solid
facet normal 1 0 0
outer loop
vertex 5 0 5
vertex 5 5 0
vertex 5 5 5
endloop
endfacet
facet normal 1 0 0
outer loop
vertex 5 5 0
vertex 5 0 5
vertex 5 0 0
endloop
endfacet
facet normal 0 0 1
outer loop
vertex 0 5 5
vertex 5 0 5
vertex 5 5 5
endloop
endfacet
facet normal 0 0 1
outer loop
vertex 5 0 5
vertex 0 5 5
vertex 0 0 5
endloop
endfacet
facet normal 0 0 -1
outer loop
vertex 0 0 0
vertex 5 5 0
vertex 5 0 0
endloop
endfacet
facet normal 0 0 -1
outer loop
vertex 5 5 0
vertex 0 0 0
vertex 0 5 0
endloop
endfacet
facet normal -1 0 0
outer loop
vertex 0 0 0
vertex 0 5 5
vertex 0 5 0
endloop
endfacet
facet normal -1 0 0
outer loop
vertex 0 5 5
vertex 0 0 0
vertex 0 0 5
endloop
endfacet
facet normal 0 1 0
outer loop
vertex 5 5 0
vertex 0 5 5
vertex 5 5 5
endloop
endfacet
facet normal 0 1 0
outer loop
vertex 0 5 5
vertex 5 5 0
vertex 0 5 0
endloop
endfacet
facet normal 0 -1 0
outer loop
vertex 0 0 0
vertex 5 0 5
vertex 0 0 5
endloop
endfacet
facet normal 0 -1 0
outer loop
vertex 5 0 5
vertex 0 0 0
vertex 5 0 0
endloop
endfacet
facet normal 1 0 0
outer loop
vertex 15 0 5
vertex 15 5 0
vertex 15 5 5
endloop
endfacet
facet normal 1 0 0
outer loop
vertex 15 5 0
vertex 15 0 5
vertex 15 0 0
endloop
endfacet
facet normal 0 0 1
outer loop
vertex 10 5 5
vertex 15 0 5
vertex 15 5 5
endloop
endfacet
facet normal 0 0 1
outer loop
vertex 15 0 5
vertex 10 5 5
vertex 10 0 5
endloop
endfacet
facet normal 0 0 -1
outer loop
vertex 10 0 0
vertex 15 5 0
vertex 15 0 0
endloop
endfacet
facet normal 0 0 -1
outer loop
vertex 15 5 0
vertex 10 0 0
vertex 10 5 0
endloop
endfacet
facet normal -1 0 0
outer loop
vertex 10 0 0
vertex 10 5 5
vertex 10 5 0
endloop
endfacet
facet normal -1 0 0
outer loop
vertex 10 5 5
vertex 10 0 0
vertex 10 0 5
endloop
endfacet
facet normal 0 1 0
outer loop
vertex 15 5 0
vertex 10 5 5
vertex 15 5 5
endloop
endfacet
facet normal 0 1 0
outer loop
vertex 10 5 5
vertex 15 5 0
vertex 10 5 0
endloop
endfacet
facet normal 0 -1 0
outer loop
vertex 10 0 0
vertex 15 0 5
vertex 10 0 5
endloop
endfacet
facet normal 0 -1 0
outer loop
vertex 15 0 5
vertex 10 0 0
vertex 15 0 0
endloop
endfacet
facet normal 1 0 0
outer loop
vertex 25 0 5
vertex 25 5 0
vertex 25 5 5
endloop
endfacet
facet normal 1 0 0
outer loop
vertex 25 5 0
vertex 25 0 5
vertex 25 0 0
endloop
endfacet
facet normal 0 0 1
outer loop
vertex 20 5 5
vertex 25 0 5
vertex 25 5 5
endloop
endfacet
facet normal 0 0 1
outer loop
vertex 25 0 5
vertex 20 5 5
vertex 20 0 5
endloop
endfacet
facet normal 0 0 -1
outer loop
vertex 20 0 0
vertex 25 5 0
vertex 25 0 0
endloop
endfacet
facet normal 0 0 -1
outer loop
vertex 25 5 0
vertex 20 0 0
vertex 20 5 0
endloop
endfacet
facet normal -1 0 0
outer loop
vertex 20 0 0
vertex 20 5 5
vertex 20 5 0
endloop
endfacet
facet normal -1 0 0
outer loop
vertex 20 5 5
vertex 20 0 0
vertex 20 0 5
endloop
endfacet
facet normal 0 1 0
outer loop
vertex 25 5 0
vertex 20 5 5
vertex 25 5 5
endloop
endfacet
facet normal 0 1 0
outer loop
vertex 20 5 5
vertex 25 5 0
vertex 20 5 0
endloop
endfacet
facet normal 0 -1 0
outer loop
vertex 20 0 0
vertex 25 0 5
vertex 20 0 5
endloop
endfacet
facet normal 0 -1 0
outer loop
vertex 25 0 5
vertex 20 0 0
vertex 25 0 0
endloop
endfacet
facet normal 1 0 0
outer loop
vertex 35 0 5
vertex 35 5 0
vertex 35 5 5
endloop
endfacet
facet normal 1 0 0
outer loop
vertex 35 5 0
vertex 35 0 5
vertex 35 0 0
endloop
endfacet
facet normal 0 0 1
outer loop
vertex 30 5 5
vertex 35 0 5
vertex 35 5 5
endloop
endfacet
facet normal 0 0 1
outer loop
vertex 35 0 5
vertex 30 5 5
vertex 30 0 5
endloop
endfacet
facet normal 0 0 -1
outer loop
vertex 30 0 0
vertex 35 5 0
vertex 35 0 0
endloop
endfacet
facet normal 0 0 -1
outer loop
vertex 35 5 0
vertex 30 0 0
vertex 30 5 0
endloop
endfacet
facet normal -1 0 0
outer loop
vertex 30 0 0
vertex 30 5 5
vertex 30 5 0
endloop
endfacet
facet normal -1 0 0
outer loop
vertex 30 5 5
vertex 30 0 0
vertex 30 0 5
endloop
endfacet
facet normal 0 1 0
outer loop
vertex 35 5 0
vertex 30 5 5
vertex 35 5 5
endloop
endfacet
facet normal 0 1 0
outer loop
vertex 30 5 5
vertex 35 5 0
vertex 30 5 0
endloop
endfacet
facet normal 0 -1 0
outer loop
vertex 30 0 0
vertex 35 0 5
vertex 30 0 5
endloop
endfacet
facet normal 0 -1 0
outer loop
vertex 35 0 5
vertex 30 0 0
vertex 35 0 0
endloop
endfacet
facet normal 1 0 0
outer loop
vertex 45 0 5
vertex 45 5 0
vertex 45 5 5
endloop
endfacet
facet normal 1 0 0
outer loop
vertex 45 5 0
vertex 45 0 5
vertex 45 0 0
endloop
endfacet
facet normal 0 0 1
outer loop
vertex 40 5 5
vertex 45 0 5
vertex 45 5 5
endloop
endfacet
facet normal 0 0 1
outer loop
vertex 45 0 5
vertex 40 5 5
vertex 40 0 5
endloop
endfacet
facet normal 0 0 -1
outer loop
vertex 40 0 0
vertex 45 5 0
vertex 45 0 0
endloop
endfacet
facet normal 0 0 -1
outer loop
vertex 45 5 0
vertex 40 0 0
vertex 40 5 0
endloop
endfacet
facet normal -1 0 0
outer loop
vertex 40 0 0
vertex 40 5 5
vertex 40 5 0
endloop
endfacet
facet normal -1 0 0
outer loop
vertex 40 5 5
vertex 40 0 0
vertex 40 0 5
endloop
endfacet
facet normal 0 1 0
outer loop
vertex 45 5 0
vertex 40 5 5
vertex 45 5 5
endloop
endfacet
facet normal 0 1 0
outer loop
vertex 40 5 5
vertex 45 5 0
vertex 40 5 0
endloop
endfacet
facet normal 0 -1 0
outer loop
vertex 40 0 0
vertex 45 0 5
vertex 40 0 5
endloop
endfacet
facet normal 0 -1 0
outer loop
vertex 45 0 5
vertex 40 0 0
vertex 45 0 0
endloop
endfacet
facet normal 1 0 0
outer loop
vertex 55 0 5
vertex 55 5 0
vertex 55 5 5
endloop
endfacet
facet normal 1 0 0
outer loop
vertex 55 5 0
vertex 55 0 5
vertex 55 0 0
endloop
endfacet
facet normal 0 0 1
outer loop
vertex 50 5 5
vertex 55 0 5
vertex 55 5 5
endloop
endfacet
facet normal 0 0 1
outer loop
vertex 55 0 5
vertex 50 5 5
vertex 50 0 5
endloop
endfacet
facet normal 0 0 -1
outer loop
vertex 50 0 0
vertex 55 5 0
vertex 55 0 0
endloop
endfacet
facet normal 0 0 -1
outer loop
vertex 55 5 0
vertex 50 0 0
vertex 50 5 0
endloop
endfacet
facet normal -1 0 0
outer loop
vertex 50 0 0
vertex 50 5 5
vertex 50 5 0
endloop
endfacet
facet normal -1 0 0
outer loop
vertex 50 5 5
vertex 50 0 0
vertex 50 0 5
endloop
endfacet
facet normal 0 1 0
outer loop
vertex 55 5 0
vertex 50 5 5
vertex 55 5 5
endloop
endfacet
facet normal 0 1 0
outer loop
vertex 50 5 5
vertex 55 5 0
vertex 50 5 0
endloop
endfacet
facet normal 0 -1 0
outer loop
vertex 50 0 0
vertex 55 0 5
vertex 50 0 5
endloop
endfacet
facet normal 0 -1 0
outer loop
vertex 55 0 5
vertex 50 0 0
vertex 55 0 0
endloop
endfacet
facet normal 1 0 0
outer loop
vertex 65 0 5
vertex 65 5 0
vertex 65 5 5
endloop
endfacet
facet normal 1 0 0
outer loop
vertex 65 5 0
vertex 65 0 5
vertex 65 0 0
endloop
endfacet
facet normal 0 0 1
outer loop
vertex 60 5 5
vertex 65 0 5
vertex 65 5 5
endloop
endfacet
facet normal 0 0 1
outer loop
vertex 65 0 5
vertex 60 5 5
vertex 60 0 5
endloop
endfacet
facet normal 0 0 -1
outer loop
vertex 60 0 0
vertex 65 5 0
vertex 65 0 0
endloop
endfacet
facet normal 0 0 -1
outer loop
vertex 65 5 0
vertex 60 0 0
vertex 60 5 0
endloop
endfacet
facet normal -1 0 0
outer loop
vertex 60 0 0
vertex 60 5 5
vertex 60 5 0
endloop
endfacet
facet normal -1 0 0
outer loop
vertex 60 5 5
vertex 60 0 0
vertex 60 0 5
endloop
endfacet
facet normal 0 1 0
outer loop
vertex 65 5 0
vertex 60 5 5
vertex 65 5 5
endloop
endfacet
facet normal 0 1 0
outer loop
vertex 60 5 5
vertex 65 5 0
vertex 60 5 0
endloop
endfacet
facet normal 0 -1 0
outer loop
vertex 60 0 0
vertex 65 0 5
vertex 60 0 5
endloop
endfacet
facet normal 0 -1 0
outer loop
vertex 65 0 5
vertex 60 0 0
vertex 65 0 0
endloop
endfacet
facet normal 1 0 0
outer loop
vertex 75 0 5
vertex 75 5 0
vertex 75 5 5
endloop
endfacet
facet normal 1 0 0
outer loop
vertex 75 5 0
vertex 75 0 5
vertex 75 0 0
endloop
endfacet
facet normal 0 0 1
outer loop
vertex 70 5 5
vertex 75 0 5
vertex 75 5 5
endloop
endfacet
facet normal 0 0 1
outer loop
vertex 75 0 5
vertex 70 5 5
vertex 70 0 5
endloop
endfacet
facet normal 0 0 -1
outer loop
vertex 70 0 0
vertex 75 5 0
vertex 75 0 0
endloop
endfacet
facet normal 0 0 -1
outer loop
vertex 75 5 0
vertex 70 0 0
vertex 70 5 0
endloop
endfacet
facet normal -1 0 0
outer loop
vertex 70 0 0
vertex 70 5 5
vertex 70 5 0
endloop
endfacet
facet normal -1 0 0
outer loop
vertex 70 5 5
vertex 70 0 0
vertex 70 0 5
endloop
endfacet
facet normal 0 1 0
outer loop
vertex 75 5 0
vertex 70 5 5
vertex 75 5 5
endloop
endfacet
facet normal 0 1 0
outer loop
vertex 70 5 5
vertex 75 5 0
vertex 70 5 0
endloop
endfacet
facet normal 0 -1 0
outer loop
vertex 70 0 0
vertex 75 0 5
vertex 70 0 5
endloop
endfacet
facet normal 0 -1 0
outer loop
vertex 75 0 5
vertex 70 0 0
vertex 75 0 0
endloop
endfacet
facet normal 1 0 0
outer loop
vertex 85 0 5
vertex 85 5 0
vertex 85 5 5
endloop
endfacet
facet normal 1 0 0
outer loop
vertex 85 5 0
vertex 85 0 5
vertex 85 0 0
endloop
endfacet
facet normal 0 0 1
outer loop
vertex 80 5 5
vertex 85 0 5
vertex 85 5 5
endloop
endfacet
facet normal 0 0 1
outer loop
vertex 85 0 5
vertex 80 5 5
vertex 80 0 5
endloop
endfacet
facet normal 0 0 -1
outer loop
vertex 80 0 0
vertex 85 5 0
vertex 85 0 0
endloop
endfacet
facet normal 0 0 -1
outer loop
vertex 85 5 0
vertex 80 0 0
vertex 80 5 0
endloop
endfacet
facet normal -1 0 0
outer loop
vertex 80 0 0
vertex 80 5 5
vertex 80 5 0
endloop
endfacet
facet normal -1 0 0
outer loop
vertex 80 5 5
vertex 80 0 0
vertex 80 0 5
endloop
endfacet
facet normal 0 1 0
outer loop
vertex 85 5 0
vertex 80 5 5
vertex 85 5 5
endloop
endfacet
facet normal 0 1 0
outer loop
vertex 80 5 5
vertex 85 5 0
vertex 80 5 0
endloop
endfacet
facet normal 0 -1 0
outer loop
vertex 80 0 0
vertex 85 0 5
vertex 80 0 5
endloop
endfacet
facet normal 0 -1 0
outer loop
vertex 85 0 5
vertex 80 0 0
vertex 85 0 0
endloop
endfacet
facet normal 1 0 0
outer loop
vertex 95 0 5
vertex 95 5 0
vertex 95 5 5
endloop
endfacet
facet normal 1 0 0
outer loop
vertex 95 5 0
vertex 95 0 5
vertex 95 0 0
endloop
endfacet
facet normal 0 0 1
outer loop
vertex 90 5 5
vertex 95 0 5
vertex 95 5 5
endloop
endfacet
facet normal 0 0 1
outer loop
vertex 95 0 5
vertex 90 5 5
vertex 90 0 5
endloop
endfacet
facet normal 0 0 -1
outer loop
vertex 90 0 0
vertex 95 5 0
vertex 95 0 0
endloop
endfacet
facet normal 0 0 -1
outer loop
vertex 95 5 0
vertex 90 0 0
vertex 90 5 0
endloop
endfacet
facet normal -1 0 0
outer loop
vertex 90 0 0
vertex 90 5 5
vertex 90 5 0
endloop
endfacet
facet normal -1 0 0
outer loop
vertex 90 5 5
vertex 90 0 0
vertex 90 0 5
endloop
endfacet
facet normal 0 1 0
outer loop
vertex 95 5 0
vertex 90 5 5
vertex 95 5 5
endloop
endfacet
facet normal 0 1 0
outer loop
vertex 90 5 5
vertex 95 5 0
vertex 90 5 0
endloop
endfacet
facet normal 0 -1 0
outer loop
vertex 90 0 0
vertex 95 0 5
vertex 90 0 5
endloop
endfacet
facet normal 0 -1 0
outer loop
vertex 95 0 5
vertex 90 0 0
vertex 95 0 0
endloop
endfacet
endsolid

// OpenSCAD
color("rot") cube(5);
translate([10,0,0]) color("lightblue") cube(5);
translate([20,0,0]) color("Rot") cube(5);
translate([30,0,0]) color("dunkelgrün") cube(5);
translate([40,0,0]) color("") cube(5);
translate([50,0,0]) color("RED") cube(5);
translate([60,0,0]) color(" red ") cube(5);
translate([70,0,0]) color("Grey") cube(5);
translate([80,0,0]) color("AQUA") cube(5);
translate([90,0,0]) color("fuchsia") cube(5);
